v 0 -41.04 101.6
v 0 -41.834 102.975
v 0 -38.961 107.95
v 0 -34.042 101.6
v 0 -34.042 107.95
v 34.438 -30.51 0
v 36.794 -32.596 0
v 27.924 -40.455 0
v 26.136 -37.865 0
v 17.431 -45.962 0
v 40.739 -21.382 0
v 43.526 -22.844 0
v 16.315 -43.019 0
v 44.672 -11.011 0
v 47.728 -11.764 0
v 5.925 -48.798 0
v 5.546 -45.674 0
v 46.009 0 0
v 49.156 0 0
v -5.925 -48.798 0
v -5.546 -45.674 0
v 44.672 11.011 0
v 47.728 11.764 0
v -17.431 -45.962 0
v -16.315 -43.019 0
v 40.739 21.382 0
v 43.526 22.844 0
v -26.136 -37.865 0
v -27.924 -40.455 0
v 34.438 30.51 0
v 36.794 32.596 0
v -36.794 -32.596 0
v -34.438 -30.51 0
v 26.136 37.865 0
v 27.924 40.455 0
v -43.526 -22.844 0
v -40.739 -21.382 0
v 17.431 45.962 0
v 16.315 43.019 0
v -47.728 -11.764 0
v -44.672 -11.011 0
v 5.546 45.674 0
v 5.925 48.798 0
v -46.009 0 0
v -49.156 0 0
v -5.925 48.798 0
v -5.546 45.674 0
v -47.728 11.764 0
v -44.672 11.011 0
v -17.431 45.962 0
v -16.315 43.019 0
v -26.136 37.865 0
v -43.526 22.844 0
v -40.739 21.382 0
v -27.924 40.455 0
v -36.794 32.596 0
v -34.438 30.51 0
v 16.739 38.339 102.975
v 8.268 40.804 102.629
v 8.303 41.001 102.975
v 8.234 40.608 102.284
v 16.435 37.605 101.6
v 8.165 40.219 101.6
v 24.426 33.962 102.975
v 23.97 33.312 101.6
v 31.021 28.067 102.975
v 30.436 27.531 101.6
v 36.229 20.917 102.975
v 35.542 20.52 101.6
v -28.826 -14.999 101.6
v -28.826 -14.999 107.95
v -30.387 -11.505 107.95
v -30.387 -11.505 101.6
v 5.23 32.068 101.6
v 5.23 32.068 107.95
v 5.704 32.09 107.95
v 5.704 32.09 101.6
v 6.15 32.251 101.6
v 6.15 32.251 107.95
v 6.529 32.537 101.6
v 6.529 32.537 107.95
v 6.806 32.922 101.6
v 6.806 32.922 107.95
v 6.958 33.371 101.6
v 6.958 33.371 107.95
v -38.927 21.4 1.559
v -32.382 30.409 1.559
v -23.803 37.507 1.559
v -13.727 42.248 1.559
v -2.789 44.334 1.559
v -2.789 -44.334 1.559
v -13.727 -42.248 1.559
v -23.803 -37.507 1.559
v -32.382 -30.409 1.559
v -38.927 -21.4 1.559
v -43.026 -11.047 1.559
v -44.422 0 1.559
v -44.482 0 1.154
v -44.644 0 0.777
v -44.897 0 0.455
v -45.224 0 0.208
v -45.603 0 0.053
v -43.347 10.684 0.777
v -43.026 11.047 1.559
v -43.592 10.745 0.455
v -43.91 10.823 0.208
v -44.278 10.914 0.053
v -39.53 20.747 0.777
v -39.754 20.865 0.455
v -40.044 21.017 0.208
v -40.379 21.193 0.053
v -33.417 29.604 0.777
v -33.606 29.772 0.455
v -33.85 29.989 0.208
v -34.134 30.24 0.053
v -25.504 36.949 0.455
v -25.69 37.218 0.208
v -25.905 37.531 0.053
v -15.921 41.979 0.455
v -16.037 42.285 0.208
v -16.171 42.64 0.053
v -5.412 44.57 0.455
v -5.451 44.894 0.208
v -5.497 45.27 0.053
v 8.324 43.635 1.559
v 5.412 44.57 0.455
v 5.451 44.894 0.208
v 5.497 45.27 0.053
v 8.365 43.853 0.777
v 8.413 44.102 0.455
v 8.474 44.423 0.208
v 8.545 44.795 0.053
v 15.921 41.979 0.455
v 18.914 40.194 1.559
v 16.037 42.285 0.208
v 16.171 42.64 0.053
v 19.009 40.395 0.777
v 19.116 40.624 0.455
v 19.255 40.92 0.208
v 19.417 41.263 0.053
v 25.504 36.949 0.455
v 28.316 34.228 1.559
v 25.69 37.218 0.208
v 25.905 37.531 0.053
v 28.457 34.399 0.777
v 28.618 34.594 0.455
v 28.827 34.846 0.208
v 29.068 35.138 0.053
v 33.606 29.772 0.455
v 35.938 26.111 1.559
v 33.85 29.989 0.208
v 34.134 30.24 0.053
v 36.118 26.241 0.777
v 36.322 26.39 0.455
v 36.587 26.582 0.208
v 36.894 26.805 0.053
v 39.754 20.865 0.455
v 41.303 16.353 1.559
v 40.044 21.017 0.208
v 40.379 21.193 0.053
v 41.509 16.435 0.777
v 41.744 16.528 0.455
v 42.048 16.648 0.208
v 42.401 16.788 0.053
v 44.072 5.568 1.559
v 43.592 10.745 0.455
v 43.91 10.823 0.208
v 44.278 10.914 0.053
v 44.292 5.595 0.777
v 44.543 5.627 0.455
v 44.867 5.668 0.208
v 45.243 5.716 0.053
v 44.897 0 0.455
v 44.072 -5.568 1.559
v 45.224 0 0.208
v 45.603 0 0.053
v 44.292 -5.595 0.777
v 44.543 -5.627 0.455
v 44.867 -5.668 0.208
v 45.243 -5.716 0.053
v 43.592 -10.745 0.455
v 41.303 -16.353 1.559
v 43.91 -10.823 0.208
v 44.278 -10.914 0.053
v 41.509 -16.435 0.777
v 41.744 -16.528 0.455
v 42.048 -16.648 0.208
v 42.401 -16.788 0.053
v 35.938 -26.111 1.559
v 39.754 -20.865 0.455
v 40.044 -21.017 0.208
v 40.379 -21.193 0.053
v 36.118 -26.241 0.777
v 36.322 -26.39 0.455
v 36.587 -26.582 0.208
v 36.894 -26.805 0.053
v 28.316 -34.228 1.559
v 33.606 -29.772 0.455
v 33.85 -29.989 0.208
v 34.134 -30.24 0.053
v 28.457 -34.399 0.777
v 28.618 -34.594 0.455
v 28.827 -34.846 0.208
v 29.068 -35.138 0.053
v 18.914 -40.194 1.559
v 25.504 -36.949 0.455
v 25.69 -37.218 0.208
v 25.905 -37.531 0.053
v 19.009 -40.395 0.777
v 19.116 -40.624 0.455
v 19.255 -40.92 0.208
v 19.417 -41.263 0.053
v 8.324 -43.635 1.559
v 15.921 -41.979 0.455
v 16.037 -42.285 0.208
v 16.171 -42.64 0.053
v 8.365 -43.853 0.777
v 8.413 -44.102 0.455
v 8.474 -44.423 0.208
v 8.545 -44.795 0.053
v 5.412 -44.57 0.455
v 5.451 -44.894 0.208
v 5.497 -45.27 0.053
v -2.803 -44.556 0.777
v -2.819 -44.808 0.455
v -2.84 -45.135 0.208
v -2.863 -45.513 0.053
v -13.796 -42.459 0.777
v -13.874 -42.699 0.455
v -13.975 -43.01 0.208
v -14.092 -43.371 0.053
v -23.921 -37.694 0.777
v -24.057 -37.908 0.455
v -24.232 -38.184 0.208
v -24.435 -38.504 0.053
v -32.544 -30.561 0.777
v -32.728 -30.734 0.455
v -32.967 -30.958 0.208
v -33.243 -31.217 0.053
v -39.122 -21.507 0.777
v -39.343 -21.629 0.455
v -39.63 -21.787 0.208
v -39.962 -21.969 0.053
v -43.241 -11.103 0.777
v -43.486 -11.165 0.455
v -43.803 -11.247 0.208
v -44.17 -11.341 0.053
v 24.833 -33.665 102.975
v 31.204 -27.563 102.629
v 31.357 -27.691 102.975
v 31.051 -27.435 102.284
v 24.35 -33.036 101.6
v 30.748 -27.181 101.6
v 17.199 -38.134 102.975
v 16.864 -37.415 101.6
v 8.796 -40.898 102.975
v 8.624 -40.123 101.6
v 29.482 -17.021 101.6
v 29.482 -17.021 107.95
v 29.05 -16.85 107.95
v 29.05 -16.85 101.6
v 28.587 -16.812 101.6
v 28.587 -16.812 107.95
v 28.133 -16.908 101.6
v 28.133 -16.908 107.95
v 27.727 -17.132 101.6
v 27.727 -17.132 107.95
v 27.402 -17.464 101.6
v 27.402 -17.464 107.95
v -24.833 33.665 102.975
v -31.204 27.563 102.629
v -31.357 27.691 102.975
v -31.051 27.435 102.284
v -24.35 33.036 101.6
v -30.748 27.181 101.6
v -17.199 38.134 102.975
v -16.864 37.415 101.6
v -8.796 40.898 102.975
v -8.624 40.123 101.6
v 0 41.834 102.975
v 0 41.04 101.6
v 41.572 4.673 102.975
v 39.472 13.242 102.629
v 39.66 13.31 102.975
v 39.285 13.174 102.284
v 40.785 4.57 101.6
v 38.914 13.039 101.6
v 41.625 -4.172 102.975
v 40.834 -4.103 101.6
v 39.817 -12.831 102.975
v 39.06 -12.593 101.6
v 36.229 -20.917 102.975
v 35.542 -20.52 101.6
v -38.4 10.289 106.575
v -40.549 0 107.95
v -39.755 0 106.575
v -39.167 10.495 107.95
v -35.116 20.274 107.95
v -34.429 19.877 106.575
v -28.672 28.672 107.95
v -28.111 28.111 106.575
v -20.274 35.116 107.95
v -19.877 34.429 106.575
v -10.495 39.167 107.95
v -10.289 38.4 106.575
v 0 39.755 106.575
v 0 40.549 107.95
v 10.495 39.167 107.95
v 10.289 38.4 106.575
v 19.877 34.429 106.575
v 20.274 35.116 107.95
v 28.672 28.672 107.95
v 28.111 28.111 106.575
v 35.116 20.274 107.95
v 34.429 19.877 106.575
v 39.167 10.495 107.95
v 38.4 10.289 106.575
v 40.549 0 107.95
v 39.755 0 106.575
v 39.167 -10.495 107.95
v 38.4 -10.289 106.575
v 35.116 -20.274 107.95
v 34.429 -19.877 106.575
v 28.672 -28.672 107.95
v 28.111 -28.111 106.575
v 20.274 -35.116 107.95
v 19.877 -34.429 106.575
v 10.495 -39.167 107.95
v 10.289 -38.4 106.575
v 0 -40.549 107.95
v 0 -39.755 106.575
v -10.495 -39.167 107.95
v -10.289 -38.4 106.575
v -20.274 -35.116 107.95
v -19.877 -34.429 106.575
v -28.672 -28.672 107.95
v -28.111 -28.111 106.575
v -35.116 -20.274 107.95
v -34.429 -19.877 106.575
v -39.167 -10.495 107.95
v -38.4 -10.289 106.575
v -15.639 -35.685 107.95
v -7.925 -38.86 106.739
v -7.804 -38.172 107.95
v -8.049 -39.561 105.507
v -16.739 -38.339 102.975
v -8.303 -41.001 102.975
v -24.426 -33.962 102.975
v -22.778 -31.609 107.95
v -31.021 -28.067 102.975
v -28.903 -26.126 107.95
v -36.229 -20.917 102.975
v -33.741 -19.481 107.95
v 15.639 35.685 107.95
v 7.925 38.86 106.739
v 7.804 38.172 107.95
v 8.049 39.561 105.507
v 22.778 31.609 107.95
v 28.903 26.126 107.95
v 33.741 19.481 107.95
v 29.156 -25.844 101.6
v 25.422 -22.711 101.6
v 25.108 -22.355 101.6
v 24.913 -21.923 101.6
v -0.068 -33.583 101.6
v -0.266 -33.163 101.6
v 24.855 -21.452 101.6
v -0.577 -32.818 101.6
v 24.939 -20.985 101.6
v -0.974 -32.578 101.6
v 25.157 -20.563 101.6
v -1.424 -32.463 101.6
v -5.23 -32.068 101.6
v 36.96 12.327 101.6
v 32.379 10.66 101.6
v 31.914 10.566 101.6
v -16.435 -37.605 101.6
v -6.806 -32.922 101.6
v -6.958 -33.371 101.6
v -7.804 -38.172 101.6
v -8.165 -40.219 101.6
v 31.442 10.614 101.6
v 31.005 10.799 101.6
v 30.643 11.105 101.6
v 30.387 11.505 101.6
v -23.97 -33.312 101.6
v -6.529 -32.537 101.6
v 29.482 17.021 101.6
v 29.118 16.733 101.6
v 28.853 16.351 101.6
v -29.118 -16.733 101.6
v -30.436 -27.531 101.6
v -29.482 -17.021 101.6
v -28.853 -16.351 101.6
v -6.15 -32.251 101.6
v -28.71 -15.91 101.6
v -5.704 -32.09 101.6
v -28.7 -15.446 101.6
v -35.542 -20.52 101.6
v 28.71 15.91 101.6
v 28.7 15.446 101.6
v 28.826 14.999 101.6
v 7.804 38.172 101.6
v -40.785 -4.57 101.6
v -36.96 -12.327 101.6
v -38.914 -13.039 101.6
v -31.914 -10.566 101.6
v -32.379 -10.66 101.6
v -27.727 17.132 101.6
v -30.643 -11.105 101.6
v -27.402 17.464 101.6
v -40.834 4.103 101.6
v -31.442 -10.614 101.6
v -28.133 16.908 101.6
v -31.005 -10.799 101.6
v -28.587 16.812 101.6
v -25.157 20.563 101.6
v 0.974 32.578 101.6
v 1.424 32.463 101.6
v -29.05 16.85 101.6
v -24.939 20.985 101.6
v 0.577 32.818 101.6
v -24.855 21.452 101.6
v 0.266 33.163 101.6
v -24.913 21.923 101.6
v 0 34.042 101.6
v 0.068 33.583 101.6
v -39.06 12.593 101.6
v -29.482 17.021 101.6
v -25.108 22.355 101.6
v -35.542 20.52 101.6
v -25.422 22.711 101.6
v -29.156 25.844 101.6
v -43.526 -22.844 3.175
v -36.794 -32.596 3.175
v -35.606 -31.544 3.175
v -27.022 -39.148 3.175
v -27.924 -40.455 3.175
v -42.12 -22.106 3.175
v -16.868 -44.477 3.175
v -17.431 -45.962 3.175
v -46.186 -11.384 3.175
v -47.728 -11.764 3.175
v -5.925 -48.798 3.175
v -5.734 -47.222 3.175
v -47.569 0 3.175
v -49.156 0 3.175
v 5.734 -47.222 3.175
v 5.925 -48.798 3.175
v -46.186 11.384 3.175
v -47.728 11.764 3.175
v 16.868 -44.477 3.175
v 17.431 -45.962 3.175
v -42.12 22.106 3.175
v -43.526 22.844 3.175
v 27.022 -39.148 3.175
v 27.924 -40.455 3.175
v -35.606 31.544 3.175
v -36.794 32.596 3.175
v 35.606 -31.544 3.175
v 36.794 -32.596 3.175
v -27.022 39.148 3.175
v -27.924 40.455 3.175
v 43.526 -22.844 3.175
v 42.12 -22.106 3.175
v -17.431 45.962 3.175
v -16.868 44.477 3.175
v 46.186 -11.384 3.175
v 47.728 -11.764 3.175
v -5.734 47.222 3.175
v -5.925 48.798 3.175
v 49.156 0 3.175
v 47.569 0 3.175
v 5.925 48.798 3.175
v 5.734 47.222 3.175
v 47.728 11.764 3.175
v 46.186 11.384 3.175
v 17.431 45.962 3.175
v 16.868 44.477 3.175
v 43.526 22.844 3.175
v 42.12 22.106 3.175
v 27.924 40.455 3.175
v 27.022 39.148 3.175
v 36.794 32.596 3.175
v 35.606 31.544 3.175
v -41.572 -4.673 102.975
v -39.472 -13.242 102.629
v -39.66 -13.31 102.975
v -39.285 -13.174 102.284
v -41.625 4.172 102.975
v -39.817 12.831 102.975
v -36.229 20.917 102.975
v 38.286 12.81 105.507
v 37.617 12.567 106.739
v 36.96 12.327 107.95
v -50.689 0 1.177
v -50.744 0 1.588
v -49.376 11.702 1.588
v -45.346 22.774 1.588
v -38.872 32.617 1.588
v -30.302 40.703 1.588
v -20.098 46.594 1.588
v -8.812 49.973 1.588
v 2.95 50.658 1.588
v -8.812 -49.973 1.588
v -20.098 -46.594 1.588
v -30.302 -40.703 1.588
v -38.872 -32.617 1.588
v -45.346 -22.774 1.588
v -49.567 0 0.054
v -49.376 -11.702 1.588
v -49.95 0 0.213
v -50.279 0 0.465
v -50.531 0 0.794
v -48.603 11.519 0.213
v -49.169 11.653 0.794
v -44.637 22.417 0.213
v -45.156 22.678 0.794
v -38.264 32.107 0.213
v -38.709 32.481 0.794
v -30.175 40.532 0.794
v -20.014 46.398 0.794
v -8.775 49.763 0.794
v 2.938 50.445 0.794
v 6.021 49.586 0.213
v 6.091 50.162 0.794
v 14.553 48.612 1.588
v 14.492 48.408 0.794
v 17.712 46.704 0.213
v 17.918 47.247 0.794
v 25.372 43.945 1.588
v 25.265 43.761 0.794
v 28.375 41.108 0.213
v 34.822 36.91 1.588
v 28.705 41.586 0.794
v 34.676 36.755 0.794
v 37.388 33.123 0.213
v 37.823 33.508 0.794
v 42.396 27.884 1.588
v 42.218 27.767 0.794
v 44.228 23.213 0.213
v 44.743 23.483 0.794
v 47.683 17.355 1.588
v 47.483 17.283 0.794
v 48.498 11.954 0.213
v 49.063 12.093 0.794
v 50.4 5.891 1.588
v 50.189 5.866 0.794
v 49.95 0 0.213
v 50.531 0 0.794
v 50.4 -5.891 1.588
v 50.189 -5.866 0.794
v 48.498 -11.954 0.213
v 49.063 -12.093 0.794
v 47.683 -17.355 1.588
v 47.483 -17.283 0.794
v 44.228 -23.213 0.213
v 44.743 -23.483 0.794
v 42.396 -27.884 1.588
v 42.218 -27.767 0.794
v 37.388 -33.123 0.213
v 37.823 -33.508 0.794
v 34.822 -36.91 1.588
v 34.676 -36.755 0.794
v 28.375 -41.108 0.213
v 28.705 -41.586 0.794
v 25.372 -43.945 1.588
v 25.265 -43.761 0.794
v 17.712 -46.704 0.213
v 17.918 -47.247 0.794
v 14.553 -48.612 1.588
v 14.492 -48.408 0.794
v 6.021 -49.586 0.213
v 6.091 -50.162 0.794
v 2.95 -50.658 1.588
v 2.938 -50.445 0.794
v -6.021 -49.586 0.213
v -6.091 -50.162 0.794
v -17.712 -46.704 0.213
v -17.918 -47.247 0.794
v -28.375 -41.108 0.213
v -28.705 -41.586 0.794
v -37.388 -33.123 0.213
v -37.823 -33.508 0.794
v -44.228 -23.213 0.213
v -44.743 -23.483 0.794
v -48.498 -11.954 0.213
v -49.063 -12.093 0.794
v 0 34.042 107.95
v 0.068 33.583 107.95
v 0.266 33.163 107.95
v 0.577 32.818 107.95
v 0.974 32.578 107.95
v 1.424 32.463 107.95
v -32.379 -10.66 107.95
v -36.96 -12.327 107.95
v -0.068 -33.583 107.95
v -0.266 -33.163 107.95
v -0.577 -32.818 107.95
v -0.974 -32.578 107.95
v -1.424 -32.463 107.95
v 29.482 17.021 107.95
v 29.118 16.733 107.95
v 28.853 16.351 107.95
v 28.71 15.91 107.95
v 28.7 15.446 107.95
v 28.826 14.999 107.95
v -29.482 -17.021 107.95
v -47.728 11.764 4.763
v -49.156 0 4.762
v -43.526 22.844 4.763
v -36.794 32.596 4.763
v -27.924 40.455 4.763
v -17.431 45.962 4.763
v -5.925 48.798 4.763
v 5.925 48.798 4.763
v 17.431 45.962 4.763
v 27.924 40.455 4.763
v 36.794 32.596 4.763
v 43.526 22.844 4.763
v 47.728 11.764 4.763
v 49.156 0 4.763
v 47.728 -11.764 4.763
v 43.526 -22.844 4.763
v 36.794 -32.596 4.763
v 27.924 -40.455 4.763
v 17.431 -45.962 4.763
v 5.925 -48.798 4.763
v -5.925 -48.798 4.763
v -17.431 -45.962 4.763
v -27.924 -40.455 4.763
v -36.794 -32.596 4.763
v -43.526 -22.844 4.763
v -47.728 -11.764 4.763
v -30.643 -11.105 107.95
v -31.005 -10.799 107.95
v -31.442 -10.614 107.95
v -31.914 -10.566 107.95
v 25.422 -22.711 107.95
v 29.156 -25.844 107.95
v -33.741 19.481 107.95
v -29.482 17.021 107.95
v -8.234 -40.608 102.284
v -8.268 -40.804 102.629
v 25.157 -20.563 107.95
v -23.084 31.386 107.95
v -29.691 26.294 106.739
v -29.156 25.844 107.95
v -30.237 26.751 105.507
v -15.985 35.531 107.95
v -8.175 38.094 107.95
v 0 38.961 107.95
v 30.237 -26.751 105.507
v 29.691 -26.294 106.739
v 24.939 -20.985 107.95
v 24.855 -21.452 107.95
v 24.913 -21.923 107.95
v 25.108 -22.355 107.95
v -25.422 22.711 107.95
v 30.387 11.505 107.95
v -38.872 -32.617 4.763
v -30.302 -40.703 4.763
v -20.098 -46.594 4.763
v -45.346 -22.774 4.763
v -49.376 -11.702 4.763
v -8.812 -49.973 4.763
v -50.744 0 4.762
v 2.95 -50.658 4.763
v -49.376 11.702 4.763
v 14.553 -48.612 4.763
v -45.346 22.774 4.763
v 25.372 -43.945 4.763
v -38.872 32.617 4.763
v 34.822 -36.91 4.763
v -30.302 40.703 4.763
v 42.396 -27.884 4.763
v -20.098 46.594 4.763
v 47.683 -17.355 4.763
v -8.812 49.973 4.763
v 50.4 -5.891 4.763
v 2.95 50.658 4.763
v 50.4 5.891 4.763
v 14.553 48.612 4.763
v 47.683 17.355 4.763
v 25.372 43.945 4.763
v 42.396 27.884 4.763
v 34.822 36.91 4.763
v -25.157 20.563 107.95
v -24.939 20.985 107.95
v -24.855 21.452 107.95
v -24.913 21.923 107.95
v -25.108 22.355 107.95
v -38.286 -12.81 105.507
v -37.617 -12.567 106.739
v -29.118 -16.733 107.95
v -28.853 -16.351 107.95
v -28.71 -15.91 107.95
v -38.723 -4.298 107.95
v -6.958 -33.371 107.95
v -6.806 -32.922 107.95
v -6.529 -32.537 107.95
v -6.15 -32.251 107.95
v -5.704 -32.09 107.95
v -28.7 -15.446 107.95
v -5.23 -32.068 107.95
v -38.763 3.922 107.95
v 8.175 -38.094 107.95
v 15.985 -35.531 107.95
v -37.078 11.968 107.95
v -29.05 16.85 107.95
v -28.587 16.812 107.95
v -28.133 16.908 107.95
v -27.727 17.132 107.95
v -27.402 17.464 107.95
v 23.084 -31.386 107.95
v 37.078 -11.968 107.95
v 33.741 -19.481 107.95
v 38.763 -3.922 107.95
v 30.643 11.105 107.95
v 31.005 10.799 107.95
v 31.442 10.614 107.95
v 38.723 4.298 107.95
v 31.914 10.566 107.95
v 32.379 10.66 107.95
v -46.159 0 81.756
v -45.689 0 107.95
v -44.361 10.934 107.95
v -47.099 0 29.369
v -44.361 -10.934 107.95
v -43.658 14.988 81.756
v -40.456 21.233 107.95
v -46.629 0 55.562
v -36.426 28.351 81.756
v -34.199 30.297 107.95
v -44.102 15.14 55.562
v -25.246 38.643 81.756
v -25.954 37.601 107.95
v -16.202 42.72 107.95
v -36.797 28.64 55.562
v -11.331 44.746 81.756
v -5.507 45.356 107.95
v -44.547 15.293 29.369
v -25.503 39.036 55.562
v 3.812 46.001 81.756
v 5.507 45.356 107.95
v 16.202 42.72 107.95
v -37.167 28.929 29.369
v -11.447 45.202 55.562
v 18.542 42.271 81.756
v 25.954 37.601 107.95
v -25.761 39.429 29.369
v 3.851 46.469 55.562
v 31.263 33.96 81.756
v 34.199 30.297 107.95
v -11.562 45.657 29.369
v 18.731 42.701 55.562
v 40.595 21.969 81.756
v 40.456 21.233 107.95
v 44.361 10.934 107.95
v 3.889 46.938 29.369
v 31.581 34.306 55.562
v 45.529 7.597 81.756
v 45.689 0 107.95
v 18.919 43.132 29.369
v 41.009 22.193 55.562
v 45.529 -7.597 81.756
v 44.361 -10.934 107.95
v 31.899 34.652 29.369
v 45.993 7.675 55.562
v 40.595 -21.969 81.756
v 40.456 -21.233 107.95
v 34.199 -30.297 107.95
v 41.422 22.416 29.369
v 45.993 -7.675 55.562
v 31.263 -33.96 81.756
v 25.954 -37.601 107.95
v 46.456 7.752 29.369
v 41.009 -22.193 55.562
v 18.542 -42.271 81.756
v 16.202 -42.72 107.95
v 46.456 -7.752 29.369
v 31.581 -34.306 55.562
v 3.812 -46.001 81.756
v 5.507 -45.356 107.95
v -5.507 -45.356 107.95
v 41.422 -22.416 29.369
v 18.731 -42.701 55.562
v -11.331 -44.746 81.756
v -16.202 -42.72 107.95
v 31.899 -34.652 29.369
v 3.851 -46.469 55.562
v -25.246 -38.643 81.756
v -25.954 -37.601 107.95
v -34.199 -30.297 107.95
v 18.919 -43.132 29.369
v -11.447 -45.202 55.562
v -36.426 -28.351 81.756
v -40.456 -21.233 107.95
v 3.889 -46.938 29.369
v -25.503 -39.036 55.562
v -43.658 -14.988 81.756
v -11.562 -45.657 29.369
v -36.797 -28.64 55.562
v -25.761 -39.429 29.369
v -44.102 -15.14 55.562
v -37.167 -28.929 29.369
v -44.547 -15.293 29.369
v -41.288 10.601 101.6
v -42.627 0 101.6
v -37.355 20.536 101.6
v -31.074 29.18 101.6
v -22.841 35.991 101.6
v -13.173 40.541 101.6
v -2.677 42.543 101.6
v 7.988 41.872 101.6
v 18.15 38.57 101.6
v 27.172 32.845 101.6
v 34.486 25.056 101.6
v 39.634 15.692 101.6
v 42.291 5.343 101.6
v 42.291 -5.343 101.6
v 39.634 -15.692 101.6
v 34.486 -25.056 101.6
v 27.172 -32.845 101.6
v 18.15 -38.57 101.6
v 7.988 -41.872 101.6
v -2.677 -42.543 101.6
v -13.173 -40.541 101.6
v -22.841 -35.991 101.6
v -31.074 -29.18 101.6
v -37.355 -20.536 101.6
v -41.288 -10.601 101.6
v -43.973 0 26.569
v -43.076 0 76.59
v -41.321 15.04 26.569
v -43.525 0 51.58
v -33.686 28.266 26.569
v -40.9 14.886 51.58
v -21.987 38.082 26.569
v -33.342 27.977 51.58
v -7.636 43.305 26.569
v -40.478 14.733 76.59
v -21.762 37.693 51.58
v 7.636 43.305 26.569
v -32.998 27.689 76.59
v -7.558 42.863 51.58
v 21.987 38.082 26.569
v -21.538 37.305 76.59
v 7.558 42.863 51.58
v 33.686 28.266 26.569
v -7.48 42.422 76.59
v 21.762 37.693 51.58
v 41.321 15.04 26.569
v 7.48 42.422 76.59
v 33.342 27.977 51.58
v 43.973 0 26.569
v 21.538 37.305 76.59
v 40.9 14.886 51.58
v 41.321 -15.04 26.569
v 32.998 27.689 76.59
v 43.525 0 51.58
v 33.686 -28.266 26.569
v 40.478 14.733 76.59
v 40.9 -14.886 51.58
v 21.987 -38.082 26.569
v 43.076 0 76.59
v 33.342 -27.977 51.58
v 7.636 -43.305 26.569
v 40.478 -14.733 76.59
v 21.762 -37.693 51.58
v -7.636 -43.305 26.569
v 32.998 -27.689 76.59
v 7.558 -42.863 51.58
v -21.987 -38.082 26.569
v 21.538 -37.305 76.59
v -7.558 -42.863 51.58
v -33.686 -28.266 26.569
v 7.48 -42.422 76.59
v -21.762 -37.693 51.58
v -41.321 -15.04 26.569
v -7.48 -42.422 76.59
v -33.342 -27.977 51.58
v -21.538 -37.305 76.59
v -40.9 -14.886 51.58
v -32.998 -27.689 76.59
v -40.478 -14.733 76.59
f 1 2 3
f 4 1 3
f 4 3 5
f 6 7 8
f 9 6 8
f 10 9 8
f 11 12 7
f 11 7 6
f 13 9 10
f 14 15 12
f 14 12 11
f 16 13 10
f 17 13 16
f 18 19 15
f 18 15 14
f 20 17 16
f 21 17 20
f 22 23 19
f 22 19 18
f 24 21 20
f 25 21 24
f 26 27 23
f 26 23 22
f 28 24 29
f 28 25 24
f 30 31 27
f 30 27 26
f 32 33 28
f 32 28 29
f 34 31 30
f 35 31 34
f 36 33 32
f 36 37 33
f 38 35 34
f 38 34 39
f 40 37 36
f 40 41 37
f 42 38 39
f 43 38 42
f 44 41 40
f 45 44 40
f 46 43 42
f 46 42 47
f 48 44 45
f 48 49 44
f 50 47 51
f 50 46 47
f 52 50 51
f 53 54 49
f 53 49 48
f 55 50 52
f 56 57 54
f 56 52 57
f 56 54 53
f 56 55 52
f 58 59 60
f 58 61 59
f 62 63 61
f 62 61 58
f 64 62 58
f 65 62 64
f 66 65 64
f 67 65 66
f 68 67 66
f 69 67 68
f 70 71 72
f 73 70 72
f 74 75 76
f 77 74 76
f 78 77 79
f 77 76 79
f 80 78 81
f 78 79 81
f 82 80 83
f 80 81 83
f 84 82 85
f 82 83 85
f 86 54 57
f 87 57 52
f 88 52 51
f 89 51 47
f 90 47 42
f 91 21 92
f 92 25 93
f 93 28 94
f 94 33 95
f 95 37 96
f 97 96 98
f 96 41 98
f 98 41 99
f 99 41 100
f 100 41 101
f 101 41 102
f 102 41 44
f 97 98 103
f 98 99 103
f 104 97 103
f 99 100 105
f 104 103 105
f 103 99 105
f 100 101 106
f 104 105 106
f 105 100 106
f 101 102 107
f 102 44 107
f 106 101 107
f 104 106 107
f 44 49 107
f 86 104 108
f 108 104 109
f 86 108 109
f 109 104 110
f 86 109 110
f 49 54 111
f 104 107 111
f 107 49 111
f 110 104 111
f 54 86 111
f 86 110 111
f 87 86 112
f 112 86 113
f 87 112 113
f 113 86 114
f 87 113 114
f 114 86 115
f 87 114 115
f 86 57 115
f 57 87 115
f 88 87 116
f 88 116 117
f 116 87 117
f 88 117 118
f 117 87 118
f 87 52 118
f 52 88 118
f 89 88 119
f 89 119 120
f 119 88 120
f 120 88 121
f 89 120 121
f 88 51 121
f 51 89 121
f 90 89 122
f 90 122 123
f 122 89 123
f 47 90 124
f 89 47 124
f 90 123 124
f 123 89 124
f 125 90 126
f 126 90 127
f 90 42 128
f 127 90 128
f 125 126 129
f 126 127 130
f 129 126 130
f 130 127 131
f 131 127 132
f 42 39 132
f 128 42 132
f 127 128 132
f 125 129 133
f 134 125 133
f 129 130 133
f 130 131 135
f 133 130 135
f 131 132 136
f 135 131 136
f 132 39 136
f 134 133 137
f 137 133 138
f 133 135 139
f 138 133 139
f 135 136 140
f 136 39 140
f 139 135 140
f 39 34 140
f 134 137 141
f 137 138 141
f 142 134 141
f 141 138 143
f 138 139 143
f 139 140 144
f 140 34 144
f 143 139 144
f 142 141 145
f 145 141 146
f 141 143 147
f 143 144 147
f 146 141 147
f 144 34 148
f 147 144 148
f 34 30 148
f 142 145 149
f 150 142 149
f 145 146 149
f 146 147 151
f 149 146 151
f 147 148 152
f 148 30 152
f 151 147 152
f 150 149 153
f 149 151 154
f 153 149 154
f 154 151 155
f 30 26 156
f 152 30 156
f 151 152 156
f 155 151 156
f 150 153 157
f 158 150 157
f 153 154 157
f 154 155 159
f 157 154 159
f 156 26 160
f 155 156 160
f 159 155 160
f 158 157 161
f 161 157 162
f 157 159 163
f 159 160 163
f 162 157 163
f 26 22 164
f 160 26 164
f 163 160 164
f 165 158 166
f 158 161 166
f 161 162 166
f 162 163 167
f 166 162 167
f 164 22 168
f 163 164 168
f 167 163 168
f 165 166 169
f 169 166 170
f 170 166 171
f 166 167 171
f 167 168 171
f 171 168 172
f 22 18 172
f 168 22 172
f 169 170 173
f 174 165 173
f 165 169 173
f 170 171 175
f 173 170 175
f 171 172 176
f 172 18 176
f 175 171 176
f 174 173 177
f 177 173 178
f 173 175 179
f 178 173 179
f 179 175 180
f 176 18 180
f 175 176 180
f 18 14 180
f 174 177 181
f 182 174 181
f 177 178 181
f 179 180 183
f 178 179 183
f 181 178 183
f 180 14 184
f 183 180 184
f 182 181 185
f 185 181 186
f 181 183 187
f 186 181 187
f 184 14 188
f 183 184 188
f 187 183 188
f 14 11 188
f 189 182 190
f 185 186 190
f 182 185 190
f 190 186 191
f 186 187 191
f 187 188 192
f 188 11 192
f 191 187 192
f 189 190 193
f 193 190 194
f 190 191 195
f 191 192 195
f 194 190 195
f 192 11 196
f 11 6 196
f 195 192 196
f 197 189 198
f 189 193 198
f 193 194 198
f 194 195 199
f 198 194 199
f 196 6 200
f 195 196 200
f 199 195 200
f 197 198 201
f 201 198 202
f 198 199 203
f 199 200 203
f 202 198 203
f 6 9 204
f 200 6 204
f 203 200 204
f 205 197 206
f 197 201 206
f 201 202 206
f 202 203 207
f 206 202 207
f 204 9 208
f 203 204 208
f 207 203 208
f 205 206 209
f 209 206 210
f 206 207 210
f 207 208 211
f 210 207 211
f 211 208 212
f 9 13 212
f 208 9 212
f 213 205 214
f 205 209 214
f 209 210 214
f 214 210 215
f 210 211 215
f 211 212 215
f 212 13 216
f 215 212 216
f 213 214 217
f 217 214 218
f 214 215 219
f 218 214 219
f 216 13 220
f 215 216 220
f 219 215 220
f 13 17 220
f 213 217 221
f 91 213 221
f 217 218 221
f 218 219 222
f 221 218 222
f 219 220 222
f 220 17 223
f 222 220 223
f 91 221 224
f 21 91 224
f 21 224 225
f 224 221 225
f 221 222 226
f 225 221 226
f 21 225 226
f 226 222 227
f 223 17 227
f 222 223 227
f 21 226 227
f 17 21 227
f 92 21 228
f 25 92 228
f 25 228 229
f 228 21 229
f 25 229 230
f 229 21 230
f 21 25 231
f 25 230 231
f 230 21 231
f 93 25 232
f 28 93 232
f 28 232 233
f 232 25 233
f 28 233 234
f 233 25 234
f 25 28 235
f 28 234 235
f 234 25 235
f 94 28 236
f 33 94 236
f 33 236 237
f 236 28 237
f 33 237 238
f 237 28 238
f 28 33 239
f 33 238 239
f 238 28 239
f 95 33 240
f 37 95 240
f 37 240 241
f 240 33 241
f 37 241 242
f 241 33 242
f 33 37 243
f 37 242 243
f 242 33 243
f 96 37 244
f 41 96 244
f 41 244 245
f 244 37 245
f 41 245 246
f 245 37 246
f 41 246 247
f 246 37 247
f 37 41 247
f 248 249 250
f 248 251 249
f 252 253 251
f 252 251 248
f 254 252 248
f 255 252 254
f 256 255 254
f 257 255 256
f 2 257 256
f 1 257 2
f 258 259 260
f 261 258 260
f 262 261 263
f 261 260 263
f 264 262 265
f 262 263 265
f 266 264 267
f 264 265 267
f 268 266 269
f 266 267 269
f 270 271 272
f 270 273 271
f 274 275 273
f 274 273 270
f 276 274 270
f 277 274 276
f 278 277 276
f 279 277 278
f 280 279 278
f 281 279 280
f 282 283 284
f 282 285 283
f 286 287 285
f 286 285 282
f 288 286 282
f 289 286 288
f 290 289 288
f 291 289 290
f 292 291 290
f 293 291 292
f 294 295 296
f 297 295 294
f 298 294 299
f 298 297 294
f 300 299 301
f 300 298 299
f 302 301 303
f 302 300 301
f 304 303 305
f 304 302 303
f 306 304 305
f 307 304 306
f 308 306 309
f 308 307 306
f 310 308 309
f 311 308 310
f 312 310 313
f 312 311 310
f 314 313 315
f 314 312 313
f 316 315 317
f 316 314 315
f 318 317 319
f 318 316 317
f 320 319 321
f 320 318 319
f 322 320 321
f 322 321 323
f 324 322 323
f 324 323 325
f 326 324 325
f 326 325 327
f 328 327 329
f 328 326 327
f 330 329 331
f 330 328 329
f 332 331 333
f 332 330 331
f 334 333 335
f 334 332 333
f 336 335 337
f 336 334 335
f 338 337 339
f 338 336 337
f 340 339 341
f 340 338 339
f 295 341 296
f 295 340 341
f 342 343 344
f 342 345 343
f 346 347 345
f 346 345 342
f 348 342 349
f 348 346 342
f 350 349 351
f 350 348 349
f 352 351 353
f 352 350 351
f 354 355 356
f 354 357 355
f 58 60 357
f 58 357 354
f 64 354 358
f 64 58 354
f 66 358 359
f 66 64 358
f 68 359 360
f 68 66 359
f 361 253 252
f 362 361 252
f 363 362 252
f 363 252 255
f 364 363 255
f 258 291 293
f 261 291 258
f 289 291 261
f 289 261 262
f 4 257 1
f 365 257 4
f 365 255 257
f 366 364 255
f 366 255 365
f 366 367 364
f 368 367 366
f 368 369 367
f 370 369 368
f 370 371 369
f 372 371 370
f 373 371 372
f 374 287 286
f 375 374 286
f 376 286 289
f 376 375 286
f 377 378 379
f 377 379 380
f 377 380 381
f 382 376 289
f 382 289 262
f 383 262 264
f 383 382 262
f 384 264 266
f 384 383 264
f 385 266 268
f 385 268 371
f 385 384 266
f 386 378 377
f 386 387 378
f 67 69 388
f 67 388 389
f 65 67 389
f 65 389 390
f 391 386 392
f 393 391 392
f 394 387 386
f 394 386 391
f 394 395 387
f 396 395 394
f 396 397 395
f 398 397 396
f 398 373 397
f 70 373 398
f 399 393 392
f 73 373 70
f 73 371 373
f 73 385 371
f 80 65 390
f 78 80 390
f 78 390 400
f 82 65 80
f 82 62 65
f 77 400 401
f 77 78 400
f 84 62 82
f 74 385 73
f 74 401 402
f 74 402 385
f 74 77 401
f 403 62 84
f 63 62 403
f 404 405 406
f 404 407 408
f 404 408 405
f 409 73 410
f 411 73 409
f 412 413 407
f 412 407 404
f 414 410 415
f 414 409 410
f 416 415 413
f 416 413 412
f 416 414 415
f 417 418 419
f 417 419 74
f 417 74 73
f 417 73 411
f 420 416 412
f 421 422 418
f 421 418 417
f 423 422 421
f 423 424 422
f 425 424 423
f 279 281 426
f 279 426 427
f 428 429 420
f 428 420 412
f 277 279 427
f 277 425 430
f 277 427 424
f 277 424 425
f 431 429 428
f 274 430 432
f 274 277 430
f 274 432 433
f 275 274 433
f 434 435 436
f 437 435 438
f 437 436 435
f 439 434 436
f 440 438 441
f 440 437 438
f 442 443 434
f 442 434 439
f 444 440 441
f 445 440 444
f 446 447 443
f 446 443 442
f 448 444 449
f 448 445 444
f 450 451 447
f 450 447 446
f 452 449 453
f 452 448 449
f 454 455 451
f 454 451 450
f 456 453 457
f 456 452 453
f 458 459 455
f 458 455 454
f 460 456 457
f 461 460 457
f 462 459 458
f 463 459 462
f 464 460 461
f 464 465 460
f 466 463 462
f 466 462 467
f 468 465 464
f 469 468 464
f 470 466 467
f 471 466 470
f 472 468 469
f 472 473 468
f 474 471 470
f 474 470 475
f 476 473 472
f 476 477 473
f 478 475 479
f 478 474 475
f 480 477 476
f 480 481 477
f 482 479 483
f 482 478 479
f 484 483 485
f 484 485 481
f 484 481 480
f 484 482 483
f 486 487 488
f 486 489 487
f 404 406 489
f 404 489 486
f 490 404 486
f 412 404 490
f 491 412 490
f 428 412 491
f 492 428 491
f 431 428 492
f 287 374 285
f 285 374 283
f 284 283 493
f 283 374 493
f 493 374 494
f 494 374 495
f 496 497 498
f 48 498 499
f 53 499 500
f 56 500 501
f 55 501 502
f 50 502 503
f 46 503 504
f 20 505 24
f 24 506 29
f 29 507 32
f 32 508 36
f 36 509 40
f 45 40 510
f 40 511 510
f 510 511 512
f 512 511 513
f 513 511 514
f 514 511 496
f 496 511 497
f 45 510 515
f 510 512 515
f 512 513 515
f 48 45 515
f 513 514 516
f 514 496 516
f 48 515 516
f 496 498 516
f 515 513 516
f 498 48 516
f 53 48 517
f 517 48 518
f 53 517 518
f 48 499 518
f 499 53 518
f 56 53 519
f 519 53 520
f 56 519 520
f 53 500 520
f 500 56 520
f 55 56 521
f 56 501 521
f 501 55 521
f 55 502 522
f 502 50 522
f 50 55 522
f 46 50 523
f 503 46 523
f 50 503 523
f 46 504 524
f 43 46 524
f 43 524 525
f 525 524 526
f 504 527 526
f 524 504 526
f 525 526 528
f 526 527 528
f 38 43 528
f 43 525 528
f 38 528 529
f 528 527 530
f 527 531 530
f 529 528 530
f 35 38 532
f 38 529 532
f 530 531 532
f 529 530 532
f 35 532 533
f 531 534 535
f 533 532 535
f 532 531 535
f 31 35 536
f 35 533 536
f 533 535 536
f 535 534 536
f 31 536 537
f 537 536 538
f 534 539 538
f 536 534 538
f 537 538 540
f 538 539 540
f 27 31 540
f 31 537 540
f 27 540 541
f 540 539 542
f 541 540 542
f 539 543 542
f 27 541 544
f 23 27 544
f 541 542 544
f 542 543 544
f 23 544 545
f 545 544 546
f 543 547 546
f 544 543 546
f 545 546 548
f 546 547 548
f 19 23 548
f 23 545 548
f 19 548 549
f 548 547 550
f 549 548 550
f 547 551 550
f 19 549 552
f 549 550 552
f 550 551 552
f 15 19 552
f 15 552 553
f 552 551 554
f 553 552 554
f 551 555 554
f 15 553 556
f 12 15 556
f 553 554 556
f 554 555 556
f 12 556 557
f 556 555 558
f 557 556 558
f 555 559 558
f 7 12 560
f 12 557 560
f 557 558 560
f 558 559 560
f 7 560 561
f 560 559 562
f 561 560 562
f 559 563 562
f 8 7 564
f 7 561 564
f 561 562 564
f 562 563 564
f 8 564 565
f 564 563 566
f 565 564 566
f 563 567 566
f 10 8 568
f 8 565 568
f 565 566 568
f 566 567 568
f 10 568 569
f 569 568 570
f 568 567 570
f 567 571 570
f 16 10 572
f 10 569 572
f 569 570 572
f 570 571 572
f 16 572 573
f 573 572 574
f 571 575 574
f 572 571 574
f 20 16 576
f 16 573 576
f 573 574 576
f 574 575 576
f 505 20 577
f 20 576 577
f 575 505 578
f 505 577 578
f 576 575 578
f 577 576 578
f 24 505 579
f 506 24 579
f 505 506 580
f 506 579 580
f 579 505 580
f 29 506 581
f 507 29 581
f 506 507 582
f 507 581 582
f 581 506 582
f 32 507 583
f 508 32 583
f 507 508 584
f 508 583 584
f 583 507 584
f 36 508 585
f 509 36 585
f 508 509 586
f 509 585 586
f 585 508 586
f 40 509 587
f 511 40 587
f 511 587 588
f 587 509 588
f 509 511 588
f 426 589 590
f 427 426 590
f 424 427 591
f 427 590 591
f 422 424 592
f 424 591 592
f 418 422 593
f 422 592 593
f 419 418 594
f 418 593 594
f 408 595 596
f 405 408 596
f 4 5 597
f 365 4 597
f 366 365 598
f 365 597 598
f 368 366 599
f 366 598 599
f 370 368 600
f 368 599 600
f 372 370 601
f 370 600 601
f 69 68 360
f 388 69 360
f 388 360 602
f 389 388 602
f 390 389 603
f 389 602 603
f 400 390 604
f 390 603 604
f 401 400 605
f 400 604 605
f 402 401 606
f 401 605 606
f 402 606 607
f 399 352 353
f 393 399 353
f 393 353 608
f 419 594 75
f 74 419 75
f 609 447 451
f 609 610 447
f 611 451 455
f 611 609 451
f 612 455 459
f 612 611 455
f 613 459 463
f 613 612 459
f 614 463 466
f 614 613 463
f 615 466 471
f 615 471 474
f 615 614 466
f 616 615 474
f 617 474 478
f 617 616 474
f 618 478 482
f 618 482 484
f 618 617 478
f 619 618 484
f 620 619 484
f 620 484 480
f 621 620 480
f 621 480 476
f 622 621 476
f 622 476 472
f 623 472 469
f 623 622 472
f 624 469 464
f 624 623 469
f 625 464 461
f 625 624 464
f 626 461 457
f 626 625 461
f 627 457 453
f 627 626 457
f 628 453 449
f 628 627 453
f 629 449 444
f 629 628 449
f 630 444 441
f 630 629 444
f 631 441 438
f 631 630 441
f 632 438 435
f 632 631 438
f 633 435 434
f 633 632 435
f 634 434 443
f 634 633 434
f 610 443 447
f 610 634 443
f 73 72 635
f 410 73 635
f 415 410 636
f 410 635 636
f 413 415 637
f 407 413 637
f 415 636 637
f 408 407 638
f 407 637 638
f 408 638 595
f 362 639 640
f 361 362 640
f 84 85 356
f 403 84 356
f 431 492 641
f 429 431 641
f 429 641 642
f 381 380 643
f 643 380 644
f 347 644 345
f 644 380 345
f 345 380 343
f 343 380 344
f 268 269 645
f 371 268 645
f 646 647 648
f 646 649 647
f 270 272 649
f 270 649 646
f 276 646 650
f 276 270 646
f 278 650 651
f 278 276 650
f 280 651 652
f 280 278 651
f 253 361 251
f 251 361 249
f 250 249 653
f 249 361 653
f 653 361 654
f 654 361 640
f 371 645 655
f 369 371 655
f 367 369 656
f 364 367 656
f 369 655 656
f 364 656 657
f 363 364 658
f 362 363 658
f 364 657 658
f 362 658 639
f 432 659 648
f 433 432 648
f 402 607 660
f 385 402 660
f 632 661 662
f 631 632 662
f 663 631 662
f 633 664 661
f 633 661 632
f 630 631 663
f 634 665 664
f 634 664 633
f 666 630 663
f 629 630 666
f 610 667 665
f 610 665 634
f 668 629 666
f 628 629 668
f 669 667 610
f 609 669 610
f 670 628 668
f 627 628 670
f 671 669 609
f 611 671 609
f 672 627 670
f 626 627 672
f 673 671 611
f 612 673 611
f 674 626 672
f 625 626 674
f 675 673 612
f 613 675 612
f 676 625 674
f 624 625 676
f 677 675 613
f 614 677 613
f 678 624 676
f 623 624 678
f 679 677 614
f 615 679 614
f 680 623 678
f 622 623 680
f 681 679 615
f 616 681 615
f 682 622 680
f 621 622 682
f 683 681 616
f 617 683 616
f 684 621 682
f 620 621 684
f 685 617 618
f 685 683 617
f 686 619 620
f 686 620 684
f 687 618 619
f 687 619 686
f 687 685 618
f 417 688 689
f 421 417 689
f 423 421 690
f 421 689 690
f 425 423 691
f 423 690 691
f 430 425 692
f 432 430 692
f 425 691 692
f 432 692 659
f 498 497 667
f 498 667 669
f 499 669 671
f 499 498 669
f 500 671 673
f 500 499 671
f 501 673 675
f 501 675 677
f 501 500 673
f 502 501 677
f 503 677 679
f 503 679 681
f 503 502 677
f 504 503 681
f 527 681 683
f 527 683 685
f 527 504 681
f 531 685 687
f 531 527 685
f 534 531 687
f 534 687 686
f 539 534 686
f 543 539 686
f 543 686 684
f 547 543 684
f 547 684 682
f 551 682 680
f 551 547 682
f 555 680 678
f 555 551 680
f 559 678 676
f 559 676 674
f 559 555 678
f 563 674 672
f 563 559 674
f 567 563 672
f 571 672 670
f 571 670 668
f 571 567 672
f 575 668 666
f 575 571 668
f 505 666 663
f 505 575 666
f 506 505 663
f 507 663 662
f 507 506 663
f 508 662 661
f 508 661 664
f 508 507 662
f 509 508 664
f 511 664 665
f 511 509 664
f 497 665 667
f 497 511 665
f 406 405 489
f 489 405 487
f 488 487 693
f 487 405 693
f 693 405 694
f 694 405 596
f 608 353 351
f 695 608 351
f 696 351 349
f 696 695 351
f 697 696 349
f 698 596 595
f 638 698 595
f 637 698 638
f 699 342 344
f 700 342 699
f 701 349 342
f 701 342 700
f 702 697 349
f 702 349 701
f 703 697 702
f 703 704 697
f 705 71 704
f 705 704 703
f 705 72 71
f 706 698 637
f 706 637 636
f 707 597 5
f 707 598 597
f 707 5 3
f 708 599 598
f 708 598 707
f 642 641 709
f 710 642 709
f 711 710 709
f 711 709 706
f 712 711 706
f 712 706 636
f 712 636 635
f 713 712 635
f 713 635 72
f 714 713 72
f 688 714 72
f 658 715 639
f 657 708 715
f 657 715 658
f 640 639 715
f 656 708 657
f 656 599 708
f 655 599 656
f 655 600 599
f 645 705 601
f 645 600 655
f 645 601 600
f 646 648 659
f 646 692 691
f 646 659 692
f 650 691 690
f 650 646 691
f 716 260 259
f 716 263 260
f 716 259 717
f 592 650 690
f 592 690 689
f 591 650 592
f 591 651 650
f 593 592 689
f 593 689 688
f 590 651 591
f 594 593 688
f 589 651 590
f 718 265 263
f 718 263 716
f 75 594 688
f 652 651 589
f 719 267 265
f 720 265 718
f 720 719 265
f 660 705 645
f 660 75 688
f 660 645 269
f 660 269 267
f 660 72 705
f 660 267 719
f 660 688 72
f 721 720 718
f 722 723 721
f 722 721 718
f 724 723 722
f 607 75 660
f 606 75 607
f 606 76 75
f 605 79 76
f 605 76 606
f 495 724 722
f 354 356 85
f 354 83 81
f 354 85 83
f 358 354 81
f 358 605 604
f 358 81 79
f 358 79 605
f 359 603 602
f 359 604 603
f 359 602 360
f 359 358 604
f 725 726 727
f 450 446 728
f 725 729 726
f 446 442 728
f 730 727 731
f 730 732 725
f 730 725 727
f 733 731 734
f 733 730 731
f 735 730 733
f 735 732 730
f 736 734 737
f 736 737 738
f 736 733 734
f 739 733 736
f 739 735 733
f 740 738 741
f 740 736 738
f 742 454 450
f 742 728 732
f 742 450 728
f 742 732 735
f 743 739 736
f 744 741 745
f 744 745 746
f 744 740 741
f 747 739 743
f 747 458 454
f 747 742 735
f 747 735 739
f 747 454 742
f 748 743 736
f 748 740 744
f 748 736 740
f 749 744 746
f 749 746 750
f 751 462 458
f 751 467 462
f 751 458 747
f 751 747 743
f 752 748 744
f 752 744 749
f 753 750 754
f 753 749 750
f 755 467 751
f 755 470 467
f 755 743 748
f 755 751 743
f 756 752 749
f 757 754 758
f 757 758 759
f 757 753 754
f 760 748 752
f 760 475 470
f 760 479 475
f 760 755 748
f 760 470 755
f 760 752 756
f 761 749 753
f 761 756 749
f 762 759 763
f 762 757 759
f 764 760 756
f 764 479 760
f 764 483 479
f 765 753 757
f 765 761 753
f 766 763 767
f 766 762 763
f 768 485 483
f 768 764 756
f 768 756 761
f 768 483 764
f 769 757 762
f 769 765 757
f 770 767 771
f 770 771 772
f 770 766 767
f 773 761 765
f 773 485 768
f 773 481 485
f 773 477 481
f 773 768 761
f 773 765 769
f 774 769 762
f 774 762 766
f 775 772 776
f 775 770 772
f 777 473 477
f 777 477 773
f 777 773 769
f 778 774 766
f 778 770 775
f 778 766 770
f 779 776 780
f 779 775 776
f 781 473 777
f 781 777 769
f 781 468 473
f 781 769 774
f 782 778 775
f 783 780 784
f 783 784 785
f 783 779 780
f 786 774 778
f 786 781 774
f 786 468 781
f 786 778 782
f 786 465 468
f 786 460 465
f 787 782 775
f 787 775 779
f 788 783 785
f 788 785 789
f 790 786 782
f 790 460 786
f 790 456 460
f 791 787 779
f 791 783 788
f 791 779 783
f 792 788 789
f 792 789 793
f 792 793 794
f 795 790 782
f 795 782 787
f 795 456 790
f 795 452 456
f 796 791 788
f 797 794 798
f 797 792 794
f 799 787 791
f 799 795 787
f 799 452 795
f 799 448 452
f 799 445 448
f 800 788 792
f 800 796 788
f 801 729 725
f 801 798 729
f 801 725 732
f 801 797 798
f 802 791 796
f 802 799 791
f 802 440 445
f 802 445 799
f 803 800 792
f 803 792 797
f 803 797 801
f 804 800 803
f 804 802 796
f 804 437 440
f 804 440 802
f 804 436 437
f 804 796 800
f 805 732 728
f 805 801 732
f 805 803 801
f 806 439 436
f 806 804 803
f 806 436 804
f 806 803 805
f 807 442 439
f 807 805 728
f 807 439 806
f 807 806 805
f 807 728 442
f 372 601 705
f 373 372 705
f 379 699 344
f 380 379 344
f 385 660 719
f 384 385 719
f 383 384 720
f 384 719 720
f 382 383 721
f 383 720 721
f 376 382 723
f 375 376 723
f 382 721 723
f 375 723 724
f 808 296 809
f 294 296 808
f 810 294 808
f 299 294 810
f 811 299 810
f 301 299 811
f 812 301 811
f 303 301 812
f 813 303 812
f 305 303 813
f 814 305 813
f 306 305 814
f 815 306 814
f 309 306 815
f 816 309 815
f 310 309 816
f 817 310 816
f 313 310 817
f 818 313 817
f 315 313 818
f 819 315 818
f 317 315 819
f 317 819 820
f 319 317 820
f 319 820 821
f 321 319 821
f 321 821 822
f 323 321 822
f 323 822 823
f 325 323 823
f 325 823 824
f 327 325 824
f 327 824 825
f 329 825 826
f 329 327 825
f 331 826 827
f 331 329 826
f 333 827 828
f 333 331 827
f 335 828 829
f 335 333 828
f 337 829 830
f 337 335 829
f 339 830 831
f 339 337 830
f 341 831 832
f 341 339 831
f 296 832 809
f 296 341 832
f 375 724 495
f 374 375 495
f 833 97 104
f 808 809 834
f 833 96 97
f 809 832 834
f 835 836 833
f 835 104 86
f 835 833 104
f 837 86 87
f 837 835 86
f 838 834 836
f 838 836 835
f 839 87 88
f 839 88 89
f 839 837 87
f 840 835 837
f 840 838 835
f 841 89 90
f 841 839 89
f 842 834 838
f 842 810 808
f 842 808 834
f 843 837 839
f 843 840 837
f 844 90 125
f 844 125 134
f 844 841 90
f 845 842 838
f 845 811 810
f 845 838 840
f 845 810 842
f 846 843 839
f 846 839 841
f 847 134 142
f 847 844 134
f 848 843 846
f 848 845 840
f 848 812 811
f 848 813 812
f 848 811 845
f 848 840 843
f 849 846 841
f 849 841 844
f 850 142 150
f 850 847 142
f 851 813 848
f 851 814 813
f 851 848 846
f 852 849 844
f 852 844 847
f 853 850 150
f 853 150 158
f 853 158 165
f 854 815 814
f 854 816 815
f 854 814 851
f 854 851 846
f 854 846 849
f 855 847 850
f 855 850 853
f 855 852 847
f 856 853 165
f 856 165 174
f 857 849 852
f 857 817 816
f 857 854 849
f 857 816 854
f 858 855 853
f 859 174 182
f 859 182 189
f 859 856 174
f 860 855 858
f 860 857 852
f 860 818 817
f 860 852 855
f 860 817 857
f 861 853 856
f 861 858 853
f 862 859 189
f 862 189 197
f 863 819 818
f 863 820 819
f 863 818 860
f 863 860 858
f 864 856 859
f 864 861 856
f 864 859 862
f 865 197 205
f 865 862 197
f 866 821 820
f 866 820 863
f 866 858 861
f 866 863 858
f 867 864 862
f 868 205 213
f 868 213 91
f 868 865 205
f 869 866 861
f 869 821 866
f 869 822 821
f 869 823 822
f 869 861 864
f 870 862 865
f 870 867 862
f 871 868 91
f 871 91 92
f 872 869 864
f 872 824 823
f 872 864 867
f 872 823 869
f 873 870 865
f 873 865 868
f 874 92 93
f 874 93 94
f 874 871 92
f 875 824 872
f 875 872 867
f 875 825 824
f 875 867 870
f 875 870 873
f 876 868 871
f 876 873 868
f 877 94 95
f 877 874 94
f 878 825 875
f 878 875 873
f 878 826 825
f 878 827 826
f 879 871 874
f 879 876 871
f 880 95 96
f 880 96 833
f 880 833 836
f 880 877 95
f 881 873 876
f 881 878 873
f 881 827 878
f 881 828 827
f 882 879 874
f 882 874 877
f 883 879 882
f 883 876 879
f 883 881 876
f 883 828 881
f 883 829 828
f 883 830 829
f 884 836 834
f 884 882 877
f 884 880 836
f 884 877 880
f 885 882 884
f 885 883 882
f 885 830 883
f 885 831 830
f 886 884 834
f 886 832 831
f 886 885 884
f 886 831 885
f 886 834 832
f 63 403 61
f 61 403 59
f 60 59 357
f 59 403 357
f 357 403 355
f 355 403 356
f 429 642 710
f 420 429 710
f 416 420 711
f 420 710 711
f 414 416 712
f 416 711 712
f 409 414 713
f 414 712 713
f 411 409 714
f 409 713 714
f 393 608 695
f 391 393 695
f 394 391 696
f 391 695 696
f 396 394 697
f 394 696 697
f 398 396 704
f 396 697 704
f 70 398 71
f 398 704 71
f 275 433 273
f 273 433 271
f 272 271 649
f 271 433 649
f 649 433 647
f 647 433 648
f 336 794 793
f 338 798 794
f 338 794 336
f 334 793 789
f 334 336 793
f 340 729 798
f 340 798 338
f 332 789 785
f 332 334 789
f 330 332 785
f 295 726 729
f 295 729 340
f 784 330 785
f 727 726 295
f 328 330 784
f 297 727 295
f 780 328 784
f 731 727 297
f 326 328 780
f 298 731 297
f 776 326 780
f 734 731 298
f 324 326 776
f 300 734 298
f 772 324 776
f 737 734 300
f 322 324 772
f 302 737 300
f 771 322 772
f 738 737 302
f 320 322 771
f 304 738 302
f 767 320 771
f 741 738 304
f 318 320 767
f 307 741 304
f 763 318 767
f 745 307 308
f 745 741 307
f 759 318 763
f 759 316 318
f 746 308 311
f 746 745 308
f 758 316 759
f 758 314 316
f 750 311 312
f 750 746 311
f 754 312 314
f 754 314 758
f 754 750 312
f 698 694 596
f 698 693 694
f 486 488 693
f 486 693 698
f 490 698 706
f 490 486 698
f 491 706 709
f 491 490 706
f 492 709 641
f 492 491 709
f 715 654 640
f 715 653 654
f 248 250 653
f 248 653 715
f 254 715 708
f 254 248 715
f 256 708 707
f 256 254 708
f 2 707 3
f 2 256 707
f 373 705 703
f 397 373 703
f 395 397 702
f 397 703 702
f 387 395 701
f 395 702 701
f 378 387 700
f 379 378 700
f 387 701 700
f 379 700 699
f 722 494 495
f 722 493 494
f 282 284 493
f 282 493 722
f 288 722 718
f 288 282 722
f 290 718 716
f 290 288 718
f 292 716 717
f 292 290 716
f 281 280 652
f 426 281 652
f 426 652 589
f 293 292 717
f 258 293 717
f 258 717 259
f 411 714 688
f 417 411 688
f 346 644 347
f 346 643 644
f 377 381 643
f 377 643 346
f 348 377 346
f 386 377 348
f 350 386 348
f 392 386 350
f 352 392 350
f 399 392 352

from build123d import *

# Parameters (mm, degrees)
F3_SIZE   = 1.5875
F3_2_SIZE = 1.5875
F4_R      = 1.5875
F6_DEPTH  = 25.4
F7_COUNT  = 6


with BuildPart() as f1:
    # F0 (on Front) → F1 (revolve)
    with BuildSketch(Plane.XZ):
        Polygon((-50.7435518079, 0), (-44.45, 0), (-42.6273097603, 101.6), (-38.961135551, 107.95), (-45.6889024982, 107.95), (-47.5685518079, 3.175), (-49.1560518079, 3.175), (-49.1560518079, 4.7625), (-50.7435518079, 4.7625), align=None)
    revolve(axis=Axis((0, 0, 104.775), (0, 0, -1)))

    # F3
    f3_edges = [f1.edges().sort_by_distance(p)[0] for p in [
        (38.961136, 0, 107.95),
    ]]
    chamfer(f3_edges, length=F3_SIZE)

    # F4
    f4_edges = [f1.edges().sort_by_distance(p)[0] for p in [
        (44.45, 0, 0),
        (50.743552, 0, 0),
    ]]
    fillet(f4_edges, radius=F4_R)


with BuildPart() as f2:
    # F0 (on Front) → F2 (revolve)
    with BuildSketch(Plane.XZ):
        Polygon((-38.961135551, 107.95), (-42.6273097603, 101.6), (0, 101.6), (0, 107.95), align=None)
    revolve(axis=Axis((0, 0, 104.775), (0, 0, -1)))

    # F3#2
    f3_2_edges = [f2.edges().sort_by_distance(p)[0] for p in [
        (42.62731, 0, 101.6),
    ]]
    chamfer(f3_2_edges, length=F3_2_SIZE)


with BuildPart() as f6:
    # F5 (on face) → F6 (new body)
    with BuildSketch(Plane.XY.offset(107.95)):
        with BuildLine():
            Line((7.8039343776, 38.1715691536), (8.906949362, 44.4270779816))
            ThreePointArc((8.906949362, 44.4270779816), (4.4753576595, 45.0895794917), (0, 45.311135551))
            Line((0, 45.311135551), (0, 38.961135551))
            ThreePointArc((0, 38.961135551), (3.9218875196, 38.7632413725), (7.8039343776, 38.1715691536))
        make_face()
        with BuildLine():
            Line((6.9575258612, 33.3713479229), (7.8039343776, 38.1715691536))
            ThreePointArc((7.8039343776, 38.1715691536), (3.9218875196, 38.7632413725), (0, 38.961135551))
            Line((0, 38.961135551), (0, 34.042317477))
            ThreePointArc((0, 34.042317477), (0.4084191051, 32.9793384117), (1.4235269206, 32.4633085856))
            Line((1.4235269206, 32.4633085856), (5.2301704739, 32.0680055135))
            ThreePointArc((5.2301704739, 32.0680055135), (6.3503139912, 32.3797755389), (6.9575258612, 33.3713479229))
        make_face()
    extrude(amount=-F6_DEPTH)


with BuildPart() as f7_1:
    # F7: instance of F6
    add(f6.part.rotate(Axis((0, 0, 104.775), (0, 0, -1)), 1 * 360 / F7_COUNT))


with BuildPart() as f7_2:
    # F7: instance of F6
    add(f6.part.rotate(Axis((0, 0, 104.775), (0, 0, -1)), 2 * 360 / F7_COUNT))


with BuildPart() as f7_3:
    # F7: instance of F6
    add(f6.part.rotate(Axis((0, 0, 104.775), (0, 0, -1)), 3 * 360 / F7_COUNT))


with BuildPart() as f7_4:
    # F7: instance of F6
    add(f6.part.rotate(Axis((0, 0, 104.775), (0, 0, -1)), 4 * 360 / F7_COUNT))


with BuildPart() as f7_5:
    # F7: instance of F6
    add(f6.part.rotate(Axis((0, 0, 104.775), (0, 0, -1)), 5 * 360 / F7_COUNT))


with BuildPart() as f2_1:
    add(f2.part)

    # F8: cut F7_4, F7_3, F7_2, F7_1, F6, F7_5
    add(f7_4.part, mode=Mode.SUBTRACT)
    add(f7_3.part, mode=Mode.SUBTRACT)
    add(f7_2.part, mode=Mode.SUBTRACT)
    add(f7_1.part, mode=Mode.SUBTRACT)
    add(f6.part, mode=Mode.SUBTRACT)
    add(f7_5.part, mode=Mode.SUBTRACT)


solid = Compound([f1.part, f2_1.part])
